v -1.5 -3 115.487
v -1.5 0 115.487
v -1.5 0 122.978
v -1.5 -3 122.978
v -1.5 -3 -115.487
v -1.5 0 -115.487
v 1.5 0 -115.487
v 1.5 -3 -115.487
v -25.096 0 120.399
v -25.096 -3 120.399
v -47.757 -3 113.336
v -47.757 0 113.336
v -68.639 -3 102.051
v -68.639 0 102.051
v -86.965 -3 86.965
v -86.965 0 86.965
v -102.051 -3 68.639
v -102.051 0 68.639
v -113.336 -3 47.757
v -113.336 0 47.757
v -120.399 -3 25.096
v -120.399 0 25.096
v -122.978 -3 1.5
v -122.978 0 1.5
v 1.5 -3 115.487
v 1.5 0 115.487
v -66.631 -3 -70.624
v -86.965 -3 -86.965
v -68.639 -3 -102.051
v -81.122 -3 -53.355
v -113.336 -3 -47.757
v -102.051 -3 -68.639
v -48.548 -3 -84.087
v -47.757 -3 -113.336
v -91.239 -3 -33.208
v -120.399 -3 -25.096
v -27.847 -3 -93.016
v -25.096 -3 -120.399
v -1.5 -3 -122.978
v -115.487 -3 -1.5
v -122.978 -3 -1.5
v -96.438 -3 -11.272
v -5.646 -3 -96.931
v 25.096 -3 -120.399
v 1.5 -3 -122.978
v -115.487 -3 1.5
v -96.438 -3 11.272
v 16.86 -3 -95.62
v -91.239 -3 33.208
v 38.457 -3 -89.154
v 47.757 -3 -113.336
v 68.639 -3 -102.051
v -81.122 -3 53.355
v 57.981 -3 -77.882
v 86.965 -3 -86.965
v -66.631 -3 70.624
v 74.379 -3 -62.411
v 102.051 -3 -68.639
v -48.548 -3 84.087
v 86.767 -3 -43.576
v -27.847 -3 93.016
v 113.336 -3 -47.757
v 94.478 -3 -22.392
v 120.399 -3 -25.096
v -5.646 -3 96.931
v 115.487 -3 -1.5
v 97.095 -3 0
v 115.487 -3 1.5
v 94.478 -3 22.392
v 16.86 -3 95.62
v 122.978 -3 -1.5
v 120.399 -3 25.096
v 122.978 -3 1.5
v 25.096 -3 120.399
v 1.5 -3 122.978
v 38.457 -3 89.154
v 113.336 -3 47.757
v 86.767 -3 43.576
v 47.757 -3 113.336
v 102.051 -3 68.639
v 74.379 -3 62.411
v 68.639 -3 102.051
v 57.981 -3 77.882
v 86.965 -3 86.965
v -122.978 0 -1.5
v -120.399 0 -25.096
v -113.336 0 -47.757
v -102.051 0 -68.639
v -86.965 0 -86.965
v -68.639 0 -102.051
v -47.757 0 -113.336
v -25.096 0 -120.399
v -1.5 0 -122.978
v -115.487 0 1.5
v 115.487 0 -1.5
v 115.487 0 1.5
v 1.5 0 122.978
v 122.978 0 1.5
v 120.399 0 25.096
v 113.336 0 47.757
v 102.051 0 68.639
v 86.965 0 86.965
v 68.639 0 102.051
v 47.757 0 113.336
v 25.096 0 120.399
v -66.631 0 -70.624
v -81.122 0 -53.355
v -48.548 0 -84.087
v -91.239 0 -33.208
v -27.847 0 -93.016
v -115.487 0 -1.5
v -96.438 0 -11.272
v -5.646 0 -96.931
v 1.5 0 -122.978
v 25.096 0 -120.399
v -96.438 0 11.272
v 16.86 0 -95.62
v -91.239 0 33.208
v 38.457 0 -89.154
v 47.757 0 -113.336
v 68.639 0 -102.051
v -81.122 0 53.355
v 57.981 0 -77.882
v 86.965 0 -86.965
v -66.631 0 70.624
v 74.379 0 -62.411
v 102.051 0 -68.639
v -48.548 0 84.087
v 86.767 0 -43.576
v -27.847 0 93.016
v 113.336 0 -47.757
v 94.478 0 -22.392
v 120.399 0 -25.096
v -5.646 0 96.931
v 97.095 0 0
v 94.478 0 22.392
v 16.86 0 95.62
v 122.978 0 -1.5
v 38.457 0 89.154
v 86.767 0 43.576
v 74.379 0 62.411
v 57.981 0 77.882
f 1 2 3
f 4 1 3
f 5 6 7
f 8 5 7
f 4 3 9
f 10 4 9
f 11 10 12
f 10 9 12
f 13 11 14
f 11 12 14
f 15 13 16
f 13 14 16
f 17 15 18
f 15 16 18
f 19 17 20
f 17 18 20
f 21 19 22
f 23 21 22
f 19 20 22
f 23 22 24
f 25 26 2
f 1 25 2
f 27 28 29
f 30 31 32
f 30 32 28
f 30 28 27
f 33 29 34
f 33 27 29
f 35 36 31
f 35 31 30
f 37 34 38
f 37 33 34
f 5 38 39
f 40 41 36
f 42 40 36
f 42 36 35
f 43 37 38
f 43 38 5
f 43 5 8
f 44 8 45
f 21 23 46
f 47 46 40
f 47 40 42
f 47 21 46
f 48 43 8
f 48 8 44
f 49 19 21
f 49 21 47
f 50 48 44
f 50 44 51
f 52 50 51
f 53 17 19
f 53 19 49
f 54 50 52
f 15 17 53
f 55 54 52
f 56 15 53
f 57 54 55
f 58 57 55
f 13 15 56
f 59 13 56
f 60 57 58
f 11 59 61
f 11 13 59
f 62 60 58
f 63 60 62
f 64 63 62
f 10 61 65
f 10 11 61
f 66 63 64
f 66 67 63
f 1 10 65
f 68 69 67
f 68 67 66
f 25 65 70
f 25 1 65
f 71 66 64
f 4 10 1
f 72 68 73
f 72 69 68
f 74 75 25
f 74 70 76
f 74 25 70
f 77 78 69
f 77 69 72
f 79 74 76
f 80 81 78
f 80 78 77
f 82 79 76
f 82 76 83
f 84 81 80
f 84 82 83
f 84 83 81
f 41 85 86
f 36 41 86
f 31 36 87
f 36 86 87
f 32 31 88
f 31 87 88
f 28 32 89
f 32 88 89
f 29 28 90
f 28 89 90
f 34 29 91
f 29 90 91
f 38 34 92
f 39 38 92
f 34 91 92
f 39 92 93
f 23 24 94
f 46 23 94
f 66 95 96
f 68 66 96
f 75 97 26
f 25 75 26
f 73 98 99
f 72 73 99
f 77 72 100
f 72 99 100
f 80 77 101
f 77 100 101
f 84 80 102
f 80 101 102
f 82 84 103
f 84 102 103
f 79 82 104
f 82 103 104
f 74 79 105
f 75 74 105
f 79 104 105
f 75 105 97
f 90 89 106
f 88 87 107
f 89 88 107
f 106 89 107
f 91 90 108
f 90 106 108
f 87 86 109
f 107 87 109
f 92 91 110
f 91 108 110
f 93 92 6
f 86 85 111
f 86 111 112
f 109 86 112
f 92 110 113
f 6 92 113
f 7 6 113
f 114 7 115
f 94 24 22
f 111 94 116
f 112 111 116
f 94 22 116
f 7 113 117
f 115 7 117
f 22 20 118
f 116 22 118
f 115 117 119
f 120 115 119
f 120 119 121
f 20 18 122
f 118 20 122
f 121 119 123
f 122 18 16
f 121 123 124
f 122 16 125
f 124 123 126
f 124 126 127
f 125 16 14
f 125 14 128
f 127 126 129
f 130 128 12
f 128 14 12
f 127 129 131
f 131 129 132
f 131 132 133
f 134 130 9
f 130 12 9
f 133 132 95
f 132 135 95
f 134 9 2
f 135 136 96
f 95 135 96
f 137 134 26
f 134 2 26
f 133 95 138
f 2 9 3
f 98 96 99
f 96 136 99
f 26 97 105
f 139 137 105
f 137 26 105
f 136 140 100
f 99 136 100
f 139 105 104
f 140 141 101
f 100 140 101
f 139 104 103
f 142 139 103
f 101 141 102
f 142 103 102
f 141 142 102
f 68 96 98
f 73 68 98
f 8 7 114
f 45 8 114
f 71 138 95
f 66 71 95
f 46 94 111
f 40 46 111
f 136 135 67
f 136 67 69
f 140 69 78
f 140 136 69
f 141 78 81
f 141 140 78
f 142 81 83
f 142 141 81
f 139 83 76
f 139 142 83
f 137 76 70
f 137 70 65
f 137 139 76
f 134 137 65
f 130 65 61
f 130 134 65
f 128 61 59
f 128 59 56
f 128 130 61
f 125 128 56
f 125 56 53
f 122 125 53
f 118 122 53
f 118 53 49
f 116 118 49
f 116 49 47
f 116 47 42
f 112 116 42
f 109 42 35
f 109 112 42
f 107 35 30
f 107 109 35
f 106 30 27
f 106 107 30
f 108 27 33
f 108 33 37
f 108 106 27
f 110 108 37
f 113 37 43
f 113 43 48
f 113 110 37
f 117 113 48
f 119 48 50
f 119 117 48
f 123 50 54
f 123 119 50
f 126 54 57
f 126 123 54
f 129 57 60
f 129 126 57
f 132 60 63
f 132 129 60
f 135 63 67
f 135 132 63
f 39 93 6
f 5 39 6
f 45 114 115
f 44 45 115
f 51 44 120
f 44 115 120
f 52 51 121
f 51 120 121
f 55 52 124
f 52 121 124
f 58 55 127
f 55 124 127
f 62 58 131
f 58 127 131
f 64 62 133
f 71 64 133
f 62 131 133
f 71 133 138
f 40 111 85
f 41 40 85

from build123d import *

# Parameters (mm, degrees)
F0_R     = 97.09501
F1_DEPTH = 3


with BuildPart() as f1:
    # F0 (on Front) → F1 (new body)
    with BuildSketch(Plane.XZ):
        with BuildLine():
            Line((-1.5, 115.487013), (-1.5, 122.977865))
            ThreePointArc((-1.5, 122.977865), (-86.964951, 86.964951), (-122.977865, 1.5))
            Line((-122.977865, 1.5), (-115.487013, 1.5))
            Line((-115.487013, 1.5), (-115.487013, -1.5))
            Line((-115.487013, -1.5), (-122.977865, -1.5))
            ThreePointArc((-122.977865, -1.5), (-86.964951, -86.964951), (-1.5, -122.977865))
            Line((-1.5, -122.977865), (-1.5, -115.487013))
            Line((-1.5, -115.487013), (1.5, -115.487013))
            Line((1.5, -115.487013), (1.5, -122.977865))
            ThreePointArc((1.5, -122.977865), (86.964951, -86.964951), (122.977865, -1.5))
            Line((122.977865, -1.5), (115.487013, -1.5))
            Line((115.487013, -1.5), (115.487013, 1.5))
            Line((115.487013, 1.5), (122.977865, 1.5))
            ThreePointArc((122.977865, 1.5), (86.964951, 86.964951), (1.5, 122.977865))
            Line((1.5, 122.977865), (1.5, 115.487013))
            Line((1.5, 115.487013), (-1.5, 115.487013))
        make_face()
        Circle(F0_R, mode=Mode.SUBTRACT)
    extrude(amount=F1_DEPTH)


solid = f1.part
